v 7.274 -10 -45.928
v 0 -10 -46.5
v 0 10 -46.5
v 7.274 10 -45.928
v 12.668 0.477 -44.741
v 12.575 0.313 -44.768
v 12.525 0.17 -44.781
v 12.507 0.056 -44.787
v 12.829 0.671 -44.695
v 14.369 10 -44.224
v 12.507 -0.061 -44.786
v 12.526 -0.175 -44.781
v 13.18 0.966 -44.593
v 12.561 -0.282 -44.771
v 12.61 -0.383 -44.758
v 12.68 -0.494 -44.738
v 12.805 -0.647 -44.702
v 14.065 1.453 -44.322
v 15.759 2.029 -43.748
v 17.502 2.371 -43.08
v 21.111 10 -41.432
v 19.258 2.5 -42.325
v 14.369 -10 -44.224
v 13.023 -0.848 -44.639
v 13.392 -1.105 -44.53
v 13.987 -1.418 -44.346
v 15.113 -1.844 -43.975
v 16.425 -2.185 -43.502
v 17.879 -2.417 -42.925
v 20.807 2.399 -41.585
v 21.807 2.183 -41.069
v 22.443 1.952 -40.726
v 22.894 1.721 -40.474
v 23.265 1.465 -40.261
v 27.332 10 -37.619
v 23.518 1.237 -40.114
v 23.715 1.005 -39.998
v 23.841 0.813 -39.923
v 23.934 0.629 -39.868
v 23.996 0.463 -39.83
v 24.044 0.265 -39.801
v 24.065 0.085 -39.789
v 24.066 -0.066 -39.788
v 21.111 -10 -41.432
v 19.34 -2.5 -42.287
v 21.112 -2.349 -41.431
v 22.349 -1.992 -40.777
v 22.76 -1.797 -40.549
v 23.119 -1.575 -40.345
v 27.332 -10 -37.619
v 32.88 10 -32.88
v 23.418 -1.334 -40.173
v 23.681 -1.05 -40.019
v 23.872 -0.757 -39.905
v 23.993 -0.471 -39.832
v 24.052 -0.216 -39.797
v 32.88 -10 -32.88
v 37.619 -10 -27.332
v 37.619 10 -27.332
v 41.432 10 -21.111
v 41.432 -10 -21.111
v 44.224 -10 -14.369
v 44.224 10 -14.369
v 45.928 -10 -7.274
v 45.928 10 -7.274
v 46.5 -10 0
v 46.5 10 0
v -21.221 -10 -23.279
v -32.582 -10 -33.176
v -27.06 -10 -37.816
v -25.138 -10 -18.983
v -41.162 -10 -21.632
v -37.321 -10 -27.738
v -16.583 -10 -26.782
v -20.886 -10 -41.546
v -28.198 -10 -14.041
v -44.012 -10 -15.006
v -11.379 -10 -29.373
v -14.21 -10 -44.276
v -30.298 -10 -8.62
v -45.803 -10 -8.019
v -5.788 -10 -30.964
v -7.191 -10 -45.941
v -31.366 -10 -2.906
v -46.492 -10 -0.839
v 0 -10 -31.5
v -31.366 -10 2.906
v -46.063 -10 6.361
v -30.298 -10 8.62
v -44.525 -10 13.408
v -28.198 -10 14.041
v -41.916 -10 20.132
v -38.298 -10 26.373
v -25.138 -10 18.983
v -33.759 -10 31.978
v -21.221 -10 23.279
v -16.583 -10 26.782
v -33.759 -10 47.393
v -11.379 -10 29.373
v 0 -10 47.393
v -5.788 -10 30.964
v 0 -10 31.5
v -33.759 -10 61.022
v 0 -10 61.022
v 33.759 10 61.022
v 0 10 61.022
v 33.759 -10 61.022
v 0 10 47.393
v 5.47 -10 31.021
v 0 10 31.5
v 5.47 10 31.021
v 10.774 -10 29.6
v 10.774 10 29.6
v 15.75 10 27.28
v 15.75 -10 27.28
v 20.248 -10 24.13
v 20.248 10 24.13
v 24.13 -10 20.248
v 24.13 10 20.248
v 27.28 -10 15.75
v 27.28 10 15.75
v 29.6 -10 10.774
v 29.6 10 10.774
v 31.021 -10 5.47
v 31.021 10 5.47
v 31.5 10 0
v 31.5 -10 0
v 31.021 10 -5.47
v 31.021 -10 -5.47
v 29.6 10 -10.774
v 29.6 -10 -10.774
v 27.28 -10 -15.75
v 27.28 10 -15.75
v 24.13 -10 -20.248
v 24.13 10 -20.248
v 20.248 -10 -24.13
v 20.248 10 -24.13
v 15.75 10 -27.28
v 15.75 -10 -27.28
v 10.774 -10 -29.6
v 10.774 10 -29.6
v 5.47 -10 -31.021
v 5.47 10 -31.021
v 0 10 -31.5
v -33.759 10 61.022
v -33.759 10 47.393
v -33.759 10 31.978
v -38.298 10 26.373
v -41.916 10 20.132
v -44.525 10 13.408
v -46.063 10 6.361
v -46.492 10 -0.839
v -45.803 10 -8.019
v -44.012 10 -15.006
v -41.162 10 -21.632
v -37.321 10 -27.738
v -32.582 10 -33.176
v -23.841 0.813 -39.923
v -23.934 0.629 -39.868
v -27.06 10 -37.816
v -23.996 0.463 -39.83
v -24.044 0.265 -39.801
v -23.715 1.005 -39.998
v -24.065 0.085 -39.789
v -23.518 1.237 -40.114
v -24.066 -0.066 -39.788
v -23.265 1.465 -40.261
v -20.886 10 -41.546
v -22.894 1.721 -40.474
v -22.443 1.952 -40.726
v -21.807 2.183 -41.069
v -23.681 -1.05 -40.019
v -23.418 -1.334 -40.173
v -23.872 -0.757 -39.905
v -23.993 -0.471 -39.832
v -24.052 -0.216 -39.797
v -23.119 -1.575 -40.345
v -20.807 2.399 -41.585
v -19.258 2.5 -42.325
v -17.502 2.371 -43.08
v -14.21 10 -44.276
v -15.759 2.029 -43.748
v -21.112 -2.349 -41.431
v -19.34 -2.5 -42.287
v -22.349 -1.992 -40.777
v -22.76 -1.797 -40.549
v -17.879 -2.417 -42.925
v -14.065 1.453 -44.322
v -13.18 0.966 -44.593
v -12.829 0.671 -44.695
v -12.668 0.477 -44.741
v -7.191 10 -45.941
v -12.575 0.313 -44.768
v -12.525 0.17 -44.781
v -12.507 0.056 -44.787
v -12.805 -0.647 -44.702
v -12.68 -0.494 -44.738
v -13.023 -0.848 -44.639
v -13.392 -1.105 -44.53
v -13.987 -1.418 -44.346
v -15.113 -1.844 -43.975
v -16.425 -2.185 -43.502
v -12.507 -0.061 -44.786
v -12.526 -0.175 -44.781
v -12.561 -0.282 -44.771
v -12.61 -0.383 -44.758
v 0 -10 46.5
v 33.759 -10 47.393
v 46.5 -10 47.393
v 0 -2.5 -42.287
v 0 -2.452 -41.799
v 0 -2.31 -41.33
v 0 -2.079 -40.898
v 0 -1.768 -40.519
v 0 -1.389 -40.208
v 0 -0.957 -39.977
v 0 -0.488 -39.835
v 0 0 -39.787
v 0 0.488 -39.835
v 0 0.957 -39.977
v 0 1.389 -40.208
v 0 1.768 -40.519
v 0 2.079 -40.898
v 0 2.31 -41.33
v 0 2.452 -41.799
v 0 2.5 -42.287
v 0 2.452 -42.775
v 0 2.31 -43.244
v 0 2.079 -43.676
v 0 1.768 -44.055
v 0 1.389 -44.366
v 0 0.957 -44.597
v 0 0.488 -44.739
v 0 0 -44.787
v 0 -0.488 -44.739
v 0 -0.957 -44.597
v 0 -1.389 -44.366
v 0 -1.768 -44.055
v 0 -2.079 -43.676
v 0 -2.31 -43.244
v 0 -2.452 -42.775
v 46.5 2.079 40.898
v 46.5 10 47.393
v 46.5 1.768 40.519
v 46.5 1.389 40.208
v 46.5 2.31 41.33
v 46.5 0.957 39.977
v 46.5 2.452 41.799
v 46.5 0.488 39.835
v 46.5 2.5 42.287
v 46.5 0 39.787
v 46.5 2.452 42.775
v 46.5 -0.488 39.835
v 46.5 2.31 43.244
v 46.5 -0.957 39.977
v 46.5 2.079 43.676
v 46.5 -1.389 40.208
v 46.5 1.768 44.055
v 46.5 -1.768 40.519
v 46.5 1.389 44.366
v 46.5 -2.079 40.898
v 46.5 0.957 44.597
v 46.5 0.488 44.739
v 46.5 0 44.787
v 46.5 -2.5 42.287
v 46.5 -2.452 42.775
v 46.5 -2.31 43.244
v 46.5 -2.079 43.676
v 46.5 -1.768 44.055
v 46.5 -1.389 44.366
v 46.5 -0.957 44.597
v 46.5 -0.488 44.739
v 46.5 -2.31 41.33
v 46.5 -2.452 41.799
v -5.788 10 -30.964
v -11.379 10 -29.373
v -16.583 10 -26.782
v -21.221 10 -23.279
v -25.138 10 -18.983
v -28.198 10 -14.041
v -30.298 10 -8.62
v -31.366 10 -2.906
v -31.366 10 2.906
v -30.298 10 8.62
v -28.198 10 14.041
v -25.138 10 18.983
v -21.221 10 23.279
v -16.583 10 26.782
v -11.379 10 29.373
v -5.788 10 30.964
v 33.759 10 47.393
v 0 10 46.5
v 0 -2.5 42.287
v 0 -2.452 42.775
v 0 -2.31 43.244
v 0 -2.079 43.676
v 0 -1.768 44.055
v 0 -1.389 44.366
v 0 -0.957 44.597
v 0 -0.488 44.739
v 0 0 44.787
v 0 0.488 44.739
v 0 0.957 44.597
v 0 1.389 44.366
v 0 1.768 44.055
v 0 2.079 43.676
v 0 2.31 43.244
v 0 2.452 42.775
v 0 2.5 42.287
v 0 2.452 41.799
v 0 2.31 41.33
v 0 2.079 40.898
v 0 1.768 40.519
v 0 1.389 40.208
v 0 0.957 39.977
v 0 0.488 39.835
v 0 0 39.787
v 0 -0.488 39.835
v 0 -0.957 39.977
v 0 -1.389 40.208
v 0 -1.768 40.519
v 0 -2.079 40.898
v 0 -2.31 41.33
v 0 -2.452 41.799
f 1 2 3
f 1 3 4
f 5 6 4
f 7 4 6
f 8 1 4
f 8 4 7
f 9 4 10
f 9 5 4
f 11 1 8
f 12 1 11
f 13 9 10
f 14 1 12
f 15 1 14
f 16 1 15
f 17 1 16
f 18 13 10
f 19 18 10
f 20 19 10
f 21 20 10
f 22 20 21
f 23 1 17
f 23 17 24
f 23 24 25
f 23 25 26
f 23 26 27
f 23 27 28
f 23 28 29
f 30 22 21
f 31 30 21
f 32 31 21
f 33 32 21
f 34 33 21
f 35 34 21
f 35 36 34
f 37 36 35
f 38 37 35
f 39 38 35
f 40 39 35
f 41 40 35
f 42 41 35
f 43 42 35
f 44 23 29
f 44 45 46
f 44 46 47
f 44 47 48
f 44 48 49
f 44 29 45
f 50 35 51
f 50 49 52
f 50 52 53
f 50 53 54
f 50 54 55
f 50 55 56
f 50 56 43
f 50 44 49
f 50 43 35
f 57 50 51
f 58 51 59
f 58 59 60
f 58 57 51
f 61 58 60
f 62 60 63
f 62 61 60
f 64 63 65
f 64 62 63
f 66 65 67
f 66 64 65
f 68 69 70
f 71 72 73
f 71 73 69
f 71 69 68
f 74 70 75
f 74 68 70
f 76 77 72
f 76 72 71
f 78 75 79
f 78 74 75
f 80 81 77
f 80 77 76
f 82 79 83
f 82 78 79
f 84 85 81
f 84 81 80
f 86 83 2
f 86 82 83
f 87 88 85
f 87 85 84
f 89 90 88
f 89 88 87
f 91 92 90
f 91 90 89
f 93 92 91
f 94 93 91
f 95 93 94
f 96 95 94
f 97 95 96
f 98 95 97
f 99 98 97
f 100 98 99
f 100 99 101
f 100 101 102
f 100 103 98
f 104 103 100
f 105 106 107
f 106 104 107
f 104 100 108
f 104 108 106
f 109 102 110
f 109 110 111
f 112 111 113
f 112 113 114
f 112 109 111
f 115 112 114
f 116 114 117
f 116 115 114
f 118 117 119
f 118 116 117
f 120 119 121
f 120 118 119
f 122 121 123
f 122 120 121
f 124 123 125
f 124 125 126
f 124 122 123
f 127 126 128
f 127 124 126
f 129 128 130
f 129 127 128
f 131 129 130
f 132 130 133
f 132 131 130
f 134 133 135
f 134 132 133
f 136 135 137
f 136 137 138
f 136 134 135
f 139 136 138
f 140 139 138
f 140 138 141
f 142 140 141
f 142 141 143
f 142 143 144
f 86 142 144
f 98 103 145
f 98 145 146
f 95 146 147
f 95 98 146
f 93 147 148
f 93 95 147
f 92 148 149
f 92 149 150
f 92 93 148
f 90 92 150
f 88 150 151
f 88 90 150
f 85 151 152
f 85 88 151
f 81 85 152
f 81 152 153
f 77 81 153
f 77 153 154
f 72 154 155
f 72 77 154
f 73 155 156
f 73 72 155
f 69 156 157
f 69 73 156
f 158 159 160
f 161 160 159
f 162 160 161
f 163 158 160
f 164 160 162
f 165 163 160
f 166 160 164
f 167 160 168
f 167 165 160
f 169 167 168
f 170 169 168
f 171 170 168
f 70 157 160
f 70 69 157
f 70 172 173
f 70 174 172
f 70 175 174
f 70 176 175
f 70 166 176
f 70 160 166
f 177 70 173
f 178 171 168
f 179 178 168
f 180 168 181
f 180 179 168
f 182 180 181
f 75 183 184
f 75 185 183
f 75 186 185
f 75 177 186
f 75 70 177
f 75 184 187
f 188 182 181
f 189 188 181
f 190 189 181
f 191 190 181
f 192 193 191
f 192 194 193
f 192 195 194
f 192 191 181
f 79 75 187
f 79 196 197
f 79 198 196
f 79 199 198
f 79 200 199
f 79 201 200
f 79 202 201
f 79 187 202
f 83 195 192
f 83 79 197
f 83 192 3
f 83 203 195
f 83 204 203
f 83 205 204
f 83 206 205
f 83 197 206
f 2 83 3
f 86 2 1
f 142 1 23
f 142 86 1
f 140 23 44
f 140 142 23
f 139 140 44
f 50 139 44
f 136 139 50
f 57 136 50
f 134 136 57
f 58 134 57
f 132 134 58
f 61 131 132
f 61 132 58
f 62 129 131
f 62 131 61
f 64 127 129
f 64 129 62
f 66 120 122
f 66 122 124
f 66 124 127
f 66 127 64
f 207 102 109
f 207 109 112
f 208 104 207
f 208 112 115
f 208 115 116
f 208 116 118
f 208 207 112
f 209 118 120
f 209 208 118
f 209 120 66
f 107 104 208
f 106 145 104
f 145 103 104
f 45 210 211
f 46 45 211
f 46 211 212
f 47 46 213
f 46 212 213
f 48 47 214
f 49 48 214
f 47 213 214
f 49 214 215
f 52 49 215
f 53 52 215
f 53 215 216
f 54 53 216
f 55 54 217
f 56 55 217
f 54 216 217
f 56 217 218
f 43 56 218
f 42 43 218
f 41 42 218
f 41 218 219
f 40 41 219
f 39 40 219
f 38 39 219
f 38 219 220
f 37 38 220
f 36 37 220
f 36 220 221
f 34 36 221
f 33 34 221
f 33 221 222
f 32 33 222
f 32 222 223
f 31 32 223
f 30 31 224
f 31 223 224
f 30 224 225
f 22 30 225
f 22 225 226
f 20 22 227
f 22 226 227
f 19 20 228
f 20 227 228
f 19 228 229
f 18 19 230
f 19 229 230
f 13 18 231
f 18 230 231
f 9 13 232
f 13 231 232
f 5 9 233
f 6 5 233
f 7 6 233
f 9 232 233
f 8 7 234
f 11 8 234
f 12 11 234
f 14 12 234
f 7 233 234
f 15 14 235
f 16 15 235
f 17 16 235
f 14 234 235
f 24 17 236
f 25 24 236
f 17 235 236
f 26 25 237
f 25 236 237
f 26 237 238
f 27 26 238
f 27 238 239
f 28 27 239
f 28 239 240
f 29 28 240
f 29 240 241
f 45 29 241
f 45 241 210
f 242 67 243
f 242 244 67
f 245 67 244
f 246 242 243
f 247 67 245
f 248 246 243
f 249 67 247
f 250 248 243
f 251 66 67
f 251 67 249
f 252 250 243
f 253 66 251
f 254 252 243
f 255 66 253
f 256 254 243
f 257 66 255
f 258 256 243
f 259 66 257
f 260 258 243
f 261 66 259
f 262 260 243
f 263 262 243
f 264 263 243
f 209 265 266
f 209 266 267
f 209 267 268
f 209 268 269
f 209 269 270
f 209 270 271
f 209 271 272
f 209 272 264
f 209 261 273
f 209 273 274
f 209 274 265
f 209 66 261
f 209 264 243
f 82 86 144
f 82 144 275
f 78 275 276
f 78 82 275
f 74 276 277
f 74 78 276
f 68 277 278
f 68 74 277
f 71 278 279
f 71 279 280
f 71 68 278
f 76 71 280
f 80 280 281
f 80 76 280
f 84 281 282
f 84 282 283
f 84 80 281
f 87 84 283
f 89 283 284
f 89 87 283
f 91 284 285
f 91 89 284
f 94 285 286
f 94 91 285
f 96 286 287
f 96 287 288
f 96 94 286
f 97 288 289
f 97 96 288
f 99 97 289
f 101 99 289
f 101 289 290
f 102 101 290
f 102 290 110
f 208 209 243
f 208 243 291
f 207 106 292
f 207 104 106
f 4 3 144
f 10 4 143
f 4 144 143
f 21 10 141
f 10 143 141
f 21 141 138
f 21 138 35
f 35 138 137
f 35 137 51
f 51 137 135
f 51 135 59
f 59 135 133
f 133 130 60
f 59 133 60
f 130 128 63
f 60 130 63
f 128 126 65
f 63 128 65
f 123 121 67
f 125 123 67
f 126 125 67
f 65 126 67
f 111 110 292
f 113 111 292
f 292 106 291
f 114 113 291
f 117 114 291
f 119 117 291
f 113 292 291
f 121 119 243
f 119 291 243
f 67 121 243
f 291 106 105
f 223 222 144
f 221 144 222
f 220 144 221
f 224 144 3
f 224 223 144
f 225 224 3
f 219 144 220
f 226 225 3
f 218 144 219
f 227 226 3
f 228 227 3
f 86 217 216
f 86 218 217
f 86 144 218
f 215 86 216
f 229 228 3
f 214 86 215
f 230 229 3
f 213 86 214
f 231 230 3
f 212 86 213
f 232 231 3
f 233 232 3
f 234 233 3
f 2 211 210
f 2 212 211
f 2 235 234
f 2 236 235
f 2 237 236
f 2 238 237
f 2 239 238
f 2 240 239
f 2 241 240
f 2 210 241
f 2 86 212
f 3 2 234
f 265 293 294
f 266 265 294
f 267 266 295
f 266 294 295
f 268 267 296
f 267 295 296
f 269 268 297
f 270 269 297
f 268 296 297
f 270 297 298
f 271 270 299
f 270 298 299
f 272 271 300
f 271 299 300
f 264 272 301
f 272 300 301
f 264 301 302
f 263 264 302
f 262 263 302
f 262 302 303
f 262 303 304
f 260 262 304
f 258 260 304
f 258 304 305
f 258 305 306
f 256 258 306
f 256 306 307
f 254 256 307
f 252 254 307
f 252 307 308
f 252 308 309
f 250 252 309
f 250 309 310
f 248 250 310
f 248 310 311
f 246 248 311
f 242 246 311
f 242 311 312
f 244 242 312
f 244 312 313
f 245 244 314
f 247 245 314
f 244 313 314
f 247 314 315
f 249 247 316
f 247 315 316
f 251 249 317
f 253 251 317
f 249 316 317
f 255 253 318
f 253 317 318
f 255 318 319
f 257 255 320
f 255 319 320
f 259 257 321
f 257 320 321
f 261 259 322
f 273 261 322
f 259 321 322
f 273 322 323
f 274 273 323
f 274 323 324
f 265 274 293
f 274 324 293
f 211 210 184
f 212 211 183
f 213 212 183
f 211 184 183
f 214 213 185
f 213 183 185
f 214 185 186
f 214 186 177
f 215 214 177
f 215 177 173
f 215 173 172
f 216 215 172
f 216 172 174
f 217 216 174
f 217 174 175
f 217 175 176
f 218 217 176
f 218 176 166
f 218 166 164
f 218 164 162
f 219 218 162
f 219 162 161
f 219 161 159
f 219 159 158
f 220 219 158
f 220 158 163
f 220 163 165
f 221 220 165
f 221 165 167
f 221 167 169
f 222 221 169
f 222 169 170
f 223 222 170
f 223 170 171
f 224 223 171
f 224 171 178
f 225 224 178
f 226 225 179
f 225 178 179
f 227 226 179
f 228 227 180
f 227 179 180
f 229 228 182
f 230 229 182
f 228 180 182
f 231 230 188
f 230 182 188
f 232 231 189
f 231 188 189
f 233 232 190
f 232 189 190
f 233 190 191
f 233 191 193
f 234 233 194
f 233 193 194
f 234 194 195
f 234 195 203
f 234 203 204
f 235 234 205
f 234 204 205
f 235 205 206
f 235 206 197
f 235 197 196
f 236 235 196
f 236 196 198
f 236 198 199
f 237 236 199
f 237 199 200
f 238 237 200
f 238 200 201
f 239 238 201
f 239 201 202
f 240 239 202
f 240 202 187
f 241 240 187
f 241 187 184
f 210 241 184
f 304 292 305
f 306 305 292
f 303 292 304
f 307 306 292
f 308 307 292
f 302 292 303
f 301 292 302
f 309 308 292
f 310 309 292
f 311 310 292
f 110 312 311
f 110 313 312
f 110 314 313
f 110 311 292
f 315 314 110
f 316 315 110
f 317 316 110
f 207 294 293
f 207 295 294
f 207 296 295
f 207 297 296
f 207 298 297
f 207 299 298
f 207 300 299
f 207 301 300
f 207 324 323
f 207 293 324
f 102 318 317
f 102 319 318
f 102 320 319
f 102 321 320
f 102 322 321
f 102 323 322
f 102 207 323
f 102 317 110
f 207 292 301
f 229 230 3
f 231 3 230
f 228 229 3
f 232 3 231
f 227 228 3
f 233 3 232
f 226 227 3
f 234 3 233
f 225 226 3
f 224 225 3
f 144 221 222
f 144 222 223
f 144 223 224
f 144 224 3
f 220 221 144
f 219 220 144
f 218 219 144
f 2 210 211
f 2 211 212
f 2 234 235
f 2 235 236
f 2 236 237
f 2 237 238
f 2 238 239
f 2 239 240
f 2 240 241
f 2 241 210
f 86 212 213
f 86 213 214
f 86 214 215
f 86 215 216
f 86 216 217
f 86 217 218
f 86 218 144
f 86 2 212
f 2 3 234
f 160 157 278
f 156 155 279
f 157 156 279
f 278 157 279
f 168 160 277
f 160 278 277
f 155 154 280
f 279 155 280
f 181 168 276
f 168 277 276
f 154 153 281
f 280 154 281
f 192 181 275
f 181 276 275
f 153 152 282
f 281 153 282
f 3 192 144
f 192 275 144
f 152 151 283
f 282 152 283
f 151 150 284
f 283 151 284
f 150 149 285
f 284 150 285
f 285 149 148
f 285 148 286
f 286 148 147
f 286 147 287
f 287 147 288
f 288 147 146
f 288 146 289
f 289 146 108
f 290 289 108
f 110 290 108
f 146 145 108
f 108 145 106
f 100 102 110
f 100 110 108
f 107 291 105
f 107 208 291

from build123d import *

# Parameters (mm, degrees)
F0_W     = 33.7587080829
F0_H     = 13.62929273
F1_DEPTH = 10
F3_D     = 5
F4_DEPTH = 10
F5_D     = 5
F5_2_D   = 5


with BuildPart() as f1:
    # F0 (on Front) → F1 (new body, symmetric)
    with BuildSketch(Plane.XZ):
        with Locations((16.8793540414, 54.2072419244)):
            Rectangle(F0_W, F0_H)
        with BuildLine():
            Line((0, 47.3925955594), (0, 46.5))
            ThreePointArc((0, 46.5), (18.3748170801, 42.7155252487), (33.7587080829, 31.9781117106))
            Line((33.7587080829, 31.9781117106), (33.7587080829, 47.3925955594))
            Line((33.7587080829, 47.3925955594), (0, 47.3925955594))
        make_face()
        with BuildLine():
            Line((0, 46.5), (0, 31.9781117106))
            Line((0, 31.9781117106), (33.7587080829, 31.9781117106))
            ThreePointArc((33.7587080829, 31.9781117106), (18.3748170801, 42.7155252487), (0, 46.5))
        make_face()
        with BuildLine():
            ThreePointArc((0, 31.5), (22.2738636074, 22.2738636074), (31.5, 0))
            ThreePointArc((31.5, 0), (22.2738636074, -22.2738636074), (0, -31.5))
            Line((0, -31.5), (0, -46.5))
            ThreePointArc((0, -46.5), (32.8804653252, -32.8804653252), (46.5, 0))
            ThreePointArc((46.5, 0), (43.1973953257, 17.2114798049), (33.7587080829, 31.9781117106))
            Line((33.7587080829, 31.9781117106), (0, 31.9781117106))
            Line((0, 31.9781117106), (0, 31.5))
        make_face()
        with BuildLine():
            Line((33.7587080829, 47.3925955594), (33.7587080829, 31.9781117106))
            ThreePointArc((33.7587080829, 31.9781117106), (43.1973953257, 17.2114798049), (46.5, 0))
            Line((46.5, 0), (46.5, 47.3925955594))
            Line((46.5, 47.3925955594), (33.7587080829, 47.3925955594))
        make_face()
    extrude(amount=F1_DEPTH, both=True)

    # F3 (through all)
    with Locations(Plane.YZ.offset(46.5)):
        with Locations((0, 42.2871597111)):
            Hole(F3_D / 2)

    # F5 (through all)
    with Locations(Plane.YZ.offset(46.5)):
        with Locations((0, -42.2871597111)):
            Hole(F5_D / 2)


with BuildPart() as f4:
    # F0 (on Front) → F4 (new body, symmetric)
    with BuildSketch(Plane.XZ):
        with BuildLine():
            Line((-33.7587080829, 31.9781117106), (0, 31.9781117106))
            Line((0, 31.9781117106), (0, 46.5))
            ThreePointArc((0, 46.5), (-18.3748170801, 42.7155252487), (-33.7587080829, 31.9781117106))
        make_face()
        with BuildLine():
            ThreePointArc((0, -31.5), (-31.5, 0), (0, 31.5))
            Line((0, 31.5), (0, 31.9781117106))
            Line((0, 31.9781117106), (-33.7587080829, 31.9781117106))
            ThreePointArc((-33.7587080829, 31.9781117106), (-43.1973953151, 17.2114798316), (-46.5, 5.75e-08))
            ThreePointArc((-46.5, 5.75e-08), (-32.8804653455, -32.8804653048), (0, -46.5))
            Line((0, -46.5), (0, -31.5))
        make_face()
        with Locations((-16.8793540414, 54.2072419244)):
            Rectangle(F0_W, F0_H)
        with BuildLine():
            ThreePointArc((-33.7587080829, 31.9781117106), (-18.3748170801, 42.7155252487), (0, 46.5))
            Line((0, 46.5), (0, 47.3925955594))
            Line((0, 47.3925955594), (-33.7587080829, 47.3925955594))
            Line((-33.7587080829, 47.3925955594), (-33.7587080829, 31.9781117106))
        make_face()
    extrude(amount=F4_DEPTH, both=True)

    # F5#2 (through all)
    with Locations(Plane.YZ.offset(46.5)):
        with Locations((0, -42.2871597111)):
            Hole(F5_2_D / 2)


solid = Compound([f1.part, f4.part])
